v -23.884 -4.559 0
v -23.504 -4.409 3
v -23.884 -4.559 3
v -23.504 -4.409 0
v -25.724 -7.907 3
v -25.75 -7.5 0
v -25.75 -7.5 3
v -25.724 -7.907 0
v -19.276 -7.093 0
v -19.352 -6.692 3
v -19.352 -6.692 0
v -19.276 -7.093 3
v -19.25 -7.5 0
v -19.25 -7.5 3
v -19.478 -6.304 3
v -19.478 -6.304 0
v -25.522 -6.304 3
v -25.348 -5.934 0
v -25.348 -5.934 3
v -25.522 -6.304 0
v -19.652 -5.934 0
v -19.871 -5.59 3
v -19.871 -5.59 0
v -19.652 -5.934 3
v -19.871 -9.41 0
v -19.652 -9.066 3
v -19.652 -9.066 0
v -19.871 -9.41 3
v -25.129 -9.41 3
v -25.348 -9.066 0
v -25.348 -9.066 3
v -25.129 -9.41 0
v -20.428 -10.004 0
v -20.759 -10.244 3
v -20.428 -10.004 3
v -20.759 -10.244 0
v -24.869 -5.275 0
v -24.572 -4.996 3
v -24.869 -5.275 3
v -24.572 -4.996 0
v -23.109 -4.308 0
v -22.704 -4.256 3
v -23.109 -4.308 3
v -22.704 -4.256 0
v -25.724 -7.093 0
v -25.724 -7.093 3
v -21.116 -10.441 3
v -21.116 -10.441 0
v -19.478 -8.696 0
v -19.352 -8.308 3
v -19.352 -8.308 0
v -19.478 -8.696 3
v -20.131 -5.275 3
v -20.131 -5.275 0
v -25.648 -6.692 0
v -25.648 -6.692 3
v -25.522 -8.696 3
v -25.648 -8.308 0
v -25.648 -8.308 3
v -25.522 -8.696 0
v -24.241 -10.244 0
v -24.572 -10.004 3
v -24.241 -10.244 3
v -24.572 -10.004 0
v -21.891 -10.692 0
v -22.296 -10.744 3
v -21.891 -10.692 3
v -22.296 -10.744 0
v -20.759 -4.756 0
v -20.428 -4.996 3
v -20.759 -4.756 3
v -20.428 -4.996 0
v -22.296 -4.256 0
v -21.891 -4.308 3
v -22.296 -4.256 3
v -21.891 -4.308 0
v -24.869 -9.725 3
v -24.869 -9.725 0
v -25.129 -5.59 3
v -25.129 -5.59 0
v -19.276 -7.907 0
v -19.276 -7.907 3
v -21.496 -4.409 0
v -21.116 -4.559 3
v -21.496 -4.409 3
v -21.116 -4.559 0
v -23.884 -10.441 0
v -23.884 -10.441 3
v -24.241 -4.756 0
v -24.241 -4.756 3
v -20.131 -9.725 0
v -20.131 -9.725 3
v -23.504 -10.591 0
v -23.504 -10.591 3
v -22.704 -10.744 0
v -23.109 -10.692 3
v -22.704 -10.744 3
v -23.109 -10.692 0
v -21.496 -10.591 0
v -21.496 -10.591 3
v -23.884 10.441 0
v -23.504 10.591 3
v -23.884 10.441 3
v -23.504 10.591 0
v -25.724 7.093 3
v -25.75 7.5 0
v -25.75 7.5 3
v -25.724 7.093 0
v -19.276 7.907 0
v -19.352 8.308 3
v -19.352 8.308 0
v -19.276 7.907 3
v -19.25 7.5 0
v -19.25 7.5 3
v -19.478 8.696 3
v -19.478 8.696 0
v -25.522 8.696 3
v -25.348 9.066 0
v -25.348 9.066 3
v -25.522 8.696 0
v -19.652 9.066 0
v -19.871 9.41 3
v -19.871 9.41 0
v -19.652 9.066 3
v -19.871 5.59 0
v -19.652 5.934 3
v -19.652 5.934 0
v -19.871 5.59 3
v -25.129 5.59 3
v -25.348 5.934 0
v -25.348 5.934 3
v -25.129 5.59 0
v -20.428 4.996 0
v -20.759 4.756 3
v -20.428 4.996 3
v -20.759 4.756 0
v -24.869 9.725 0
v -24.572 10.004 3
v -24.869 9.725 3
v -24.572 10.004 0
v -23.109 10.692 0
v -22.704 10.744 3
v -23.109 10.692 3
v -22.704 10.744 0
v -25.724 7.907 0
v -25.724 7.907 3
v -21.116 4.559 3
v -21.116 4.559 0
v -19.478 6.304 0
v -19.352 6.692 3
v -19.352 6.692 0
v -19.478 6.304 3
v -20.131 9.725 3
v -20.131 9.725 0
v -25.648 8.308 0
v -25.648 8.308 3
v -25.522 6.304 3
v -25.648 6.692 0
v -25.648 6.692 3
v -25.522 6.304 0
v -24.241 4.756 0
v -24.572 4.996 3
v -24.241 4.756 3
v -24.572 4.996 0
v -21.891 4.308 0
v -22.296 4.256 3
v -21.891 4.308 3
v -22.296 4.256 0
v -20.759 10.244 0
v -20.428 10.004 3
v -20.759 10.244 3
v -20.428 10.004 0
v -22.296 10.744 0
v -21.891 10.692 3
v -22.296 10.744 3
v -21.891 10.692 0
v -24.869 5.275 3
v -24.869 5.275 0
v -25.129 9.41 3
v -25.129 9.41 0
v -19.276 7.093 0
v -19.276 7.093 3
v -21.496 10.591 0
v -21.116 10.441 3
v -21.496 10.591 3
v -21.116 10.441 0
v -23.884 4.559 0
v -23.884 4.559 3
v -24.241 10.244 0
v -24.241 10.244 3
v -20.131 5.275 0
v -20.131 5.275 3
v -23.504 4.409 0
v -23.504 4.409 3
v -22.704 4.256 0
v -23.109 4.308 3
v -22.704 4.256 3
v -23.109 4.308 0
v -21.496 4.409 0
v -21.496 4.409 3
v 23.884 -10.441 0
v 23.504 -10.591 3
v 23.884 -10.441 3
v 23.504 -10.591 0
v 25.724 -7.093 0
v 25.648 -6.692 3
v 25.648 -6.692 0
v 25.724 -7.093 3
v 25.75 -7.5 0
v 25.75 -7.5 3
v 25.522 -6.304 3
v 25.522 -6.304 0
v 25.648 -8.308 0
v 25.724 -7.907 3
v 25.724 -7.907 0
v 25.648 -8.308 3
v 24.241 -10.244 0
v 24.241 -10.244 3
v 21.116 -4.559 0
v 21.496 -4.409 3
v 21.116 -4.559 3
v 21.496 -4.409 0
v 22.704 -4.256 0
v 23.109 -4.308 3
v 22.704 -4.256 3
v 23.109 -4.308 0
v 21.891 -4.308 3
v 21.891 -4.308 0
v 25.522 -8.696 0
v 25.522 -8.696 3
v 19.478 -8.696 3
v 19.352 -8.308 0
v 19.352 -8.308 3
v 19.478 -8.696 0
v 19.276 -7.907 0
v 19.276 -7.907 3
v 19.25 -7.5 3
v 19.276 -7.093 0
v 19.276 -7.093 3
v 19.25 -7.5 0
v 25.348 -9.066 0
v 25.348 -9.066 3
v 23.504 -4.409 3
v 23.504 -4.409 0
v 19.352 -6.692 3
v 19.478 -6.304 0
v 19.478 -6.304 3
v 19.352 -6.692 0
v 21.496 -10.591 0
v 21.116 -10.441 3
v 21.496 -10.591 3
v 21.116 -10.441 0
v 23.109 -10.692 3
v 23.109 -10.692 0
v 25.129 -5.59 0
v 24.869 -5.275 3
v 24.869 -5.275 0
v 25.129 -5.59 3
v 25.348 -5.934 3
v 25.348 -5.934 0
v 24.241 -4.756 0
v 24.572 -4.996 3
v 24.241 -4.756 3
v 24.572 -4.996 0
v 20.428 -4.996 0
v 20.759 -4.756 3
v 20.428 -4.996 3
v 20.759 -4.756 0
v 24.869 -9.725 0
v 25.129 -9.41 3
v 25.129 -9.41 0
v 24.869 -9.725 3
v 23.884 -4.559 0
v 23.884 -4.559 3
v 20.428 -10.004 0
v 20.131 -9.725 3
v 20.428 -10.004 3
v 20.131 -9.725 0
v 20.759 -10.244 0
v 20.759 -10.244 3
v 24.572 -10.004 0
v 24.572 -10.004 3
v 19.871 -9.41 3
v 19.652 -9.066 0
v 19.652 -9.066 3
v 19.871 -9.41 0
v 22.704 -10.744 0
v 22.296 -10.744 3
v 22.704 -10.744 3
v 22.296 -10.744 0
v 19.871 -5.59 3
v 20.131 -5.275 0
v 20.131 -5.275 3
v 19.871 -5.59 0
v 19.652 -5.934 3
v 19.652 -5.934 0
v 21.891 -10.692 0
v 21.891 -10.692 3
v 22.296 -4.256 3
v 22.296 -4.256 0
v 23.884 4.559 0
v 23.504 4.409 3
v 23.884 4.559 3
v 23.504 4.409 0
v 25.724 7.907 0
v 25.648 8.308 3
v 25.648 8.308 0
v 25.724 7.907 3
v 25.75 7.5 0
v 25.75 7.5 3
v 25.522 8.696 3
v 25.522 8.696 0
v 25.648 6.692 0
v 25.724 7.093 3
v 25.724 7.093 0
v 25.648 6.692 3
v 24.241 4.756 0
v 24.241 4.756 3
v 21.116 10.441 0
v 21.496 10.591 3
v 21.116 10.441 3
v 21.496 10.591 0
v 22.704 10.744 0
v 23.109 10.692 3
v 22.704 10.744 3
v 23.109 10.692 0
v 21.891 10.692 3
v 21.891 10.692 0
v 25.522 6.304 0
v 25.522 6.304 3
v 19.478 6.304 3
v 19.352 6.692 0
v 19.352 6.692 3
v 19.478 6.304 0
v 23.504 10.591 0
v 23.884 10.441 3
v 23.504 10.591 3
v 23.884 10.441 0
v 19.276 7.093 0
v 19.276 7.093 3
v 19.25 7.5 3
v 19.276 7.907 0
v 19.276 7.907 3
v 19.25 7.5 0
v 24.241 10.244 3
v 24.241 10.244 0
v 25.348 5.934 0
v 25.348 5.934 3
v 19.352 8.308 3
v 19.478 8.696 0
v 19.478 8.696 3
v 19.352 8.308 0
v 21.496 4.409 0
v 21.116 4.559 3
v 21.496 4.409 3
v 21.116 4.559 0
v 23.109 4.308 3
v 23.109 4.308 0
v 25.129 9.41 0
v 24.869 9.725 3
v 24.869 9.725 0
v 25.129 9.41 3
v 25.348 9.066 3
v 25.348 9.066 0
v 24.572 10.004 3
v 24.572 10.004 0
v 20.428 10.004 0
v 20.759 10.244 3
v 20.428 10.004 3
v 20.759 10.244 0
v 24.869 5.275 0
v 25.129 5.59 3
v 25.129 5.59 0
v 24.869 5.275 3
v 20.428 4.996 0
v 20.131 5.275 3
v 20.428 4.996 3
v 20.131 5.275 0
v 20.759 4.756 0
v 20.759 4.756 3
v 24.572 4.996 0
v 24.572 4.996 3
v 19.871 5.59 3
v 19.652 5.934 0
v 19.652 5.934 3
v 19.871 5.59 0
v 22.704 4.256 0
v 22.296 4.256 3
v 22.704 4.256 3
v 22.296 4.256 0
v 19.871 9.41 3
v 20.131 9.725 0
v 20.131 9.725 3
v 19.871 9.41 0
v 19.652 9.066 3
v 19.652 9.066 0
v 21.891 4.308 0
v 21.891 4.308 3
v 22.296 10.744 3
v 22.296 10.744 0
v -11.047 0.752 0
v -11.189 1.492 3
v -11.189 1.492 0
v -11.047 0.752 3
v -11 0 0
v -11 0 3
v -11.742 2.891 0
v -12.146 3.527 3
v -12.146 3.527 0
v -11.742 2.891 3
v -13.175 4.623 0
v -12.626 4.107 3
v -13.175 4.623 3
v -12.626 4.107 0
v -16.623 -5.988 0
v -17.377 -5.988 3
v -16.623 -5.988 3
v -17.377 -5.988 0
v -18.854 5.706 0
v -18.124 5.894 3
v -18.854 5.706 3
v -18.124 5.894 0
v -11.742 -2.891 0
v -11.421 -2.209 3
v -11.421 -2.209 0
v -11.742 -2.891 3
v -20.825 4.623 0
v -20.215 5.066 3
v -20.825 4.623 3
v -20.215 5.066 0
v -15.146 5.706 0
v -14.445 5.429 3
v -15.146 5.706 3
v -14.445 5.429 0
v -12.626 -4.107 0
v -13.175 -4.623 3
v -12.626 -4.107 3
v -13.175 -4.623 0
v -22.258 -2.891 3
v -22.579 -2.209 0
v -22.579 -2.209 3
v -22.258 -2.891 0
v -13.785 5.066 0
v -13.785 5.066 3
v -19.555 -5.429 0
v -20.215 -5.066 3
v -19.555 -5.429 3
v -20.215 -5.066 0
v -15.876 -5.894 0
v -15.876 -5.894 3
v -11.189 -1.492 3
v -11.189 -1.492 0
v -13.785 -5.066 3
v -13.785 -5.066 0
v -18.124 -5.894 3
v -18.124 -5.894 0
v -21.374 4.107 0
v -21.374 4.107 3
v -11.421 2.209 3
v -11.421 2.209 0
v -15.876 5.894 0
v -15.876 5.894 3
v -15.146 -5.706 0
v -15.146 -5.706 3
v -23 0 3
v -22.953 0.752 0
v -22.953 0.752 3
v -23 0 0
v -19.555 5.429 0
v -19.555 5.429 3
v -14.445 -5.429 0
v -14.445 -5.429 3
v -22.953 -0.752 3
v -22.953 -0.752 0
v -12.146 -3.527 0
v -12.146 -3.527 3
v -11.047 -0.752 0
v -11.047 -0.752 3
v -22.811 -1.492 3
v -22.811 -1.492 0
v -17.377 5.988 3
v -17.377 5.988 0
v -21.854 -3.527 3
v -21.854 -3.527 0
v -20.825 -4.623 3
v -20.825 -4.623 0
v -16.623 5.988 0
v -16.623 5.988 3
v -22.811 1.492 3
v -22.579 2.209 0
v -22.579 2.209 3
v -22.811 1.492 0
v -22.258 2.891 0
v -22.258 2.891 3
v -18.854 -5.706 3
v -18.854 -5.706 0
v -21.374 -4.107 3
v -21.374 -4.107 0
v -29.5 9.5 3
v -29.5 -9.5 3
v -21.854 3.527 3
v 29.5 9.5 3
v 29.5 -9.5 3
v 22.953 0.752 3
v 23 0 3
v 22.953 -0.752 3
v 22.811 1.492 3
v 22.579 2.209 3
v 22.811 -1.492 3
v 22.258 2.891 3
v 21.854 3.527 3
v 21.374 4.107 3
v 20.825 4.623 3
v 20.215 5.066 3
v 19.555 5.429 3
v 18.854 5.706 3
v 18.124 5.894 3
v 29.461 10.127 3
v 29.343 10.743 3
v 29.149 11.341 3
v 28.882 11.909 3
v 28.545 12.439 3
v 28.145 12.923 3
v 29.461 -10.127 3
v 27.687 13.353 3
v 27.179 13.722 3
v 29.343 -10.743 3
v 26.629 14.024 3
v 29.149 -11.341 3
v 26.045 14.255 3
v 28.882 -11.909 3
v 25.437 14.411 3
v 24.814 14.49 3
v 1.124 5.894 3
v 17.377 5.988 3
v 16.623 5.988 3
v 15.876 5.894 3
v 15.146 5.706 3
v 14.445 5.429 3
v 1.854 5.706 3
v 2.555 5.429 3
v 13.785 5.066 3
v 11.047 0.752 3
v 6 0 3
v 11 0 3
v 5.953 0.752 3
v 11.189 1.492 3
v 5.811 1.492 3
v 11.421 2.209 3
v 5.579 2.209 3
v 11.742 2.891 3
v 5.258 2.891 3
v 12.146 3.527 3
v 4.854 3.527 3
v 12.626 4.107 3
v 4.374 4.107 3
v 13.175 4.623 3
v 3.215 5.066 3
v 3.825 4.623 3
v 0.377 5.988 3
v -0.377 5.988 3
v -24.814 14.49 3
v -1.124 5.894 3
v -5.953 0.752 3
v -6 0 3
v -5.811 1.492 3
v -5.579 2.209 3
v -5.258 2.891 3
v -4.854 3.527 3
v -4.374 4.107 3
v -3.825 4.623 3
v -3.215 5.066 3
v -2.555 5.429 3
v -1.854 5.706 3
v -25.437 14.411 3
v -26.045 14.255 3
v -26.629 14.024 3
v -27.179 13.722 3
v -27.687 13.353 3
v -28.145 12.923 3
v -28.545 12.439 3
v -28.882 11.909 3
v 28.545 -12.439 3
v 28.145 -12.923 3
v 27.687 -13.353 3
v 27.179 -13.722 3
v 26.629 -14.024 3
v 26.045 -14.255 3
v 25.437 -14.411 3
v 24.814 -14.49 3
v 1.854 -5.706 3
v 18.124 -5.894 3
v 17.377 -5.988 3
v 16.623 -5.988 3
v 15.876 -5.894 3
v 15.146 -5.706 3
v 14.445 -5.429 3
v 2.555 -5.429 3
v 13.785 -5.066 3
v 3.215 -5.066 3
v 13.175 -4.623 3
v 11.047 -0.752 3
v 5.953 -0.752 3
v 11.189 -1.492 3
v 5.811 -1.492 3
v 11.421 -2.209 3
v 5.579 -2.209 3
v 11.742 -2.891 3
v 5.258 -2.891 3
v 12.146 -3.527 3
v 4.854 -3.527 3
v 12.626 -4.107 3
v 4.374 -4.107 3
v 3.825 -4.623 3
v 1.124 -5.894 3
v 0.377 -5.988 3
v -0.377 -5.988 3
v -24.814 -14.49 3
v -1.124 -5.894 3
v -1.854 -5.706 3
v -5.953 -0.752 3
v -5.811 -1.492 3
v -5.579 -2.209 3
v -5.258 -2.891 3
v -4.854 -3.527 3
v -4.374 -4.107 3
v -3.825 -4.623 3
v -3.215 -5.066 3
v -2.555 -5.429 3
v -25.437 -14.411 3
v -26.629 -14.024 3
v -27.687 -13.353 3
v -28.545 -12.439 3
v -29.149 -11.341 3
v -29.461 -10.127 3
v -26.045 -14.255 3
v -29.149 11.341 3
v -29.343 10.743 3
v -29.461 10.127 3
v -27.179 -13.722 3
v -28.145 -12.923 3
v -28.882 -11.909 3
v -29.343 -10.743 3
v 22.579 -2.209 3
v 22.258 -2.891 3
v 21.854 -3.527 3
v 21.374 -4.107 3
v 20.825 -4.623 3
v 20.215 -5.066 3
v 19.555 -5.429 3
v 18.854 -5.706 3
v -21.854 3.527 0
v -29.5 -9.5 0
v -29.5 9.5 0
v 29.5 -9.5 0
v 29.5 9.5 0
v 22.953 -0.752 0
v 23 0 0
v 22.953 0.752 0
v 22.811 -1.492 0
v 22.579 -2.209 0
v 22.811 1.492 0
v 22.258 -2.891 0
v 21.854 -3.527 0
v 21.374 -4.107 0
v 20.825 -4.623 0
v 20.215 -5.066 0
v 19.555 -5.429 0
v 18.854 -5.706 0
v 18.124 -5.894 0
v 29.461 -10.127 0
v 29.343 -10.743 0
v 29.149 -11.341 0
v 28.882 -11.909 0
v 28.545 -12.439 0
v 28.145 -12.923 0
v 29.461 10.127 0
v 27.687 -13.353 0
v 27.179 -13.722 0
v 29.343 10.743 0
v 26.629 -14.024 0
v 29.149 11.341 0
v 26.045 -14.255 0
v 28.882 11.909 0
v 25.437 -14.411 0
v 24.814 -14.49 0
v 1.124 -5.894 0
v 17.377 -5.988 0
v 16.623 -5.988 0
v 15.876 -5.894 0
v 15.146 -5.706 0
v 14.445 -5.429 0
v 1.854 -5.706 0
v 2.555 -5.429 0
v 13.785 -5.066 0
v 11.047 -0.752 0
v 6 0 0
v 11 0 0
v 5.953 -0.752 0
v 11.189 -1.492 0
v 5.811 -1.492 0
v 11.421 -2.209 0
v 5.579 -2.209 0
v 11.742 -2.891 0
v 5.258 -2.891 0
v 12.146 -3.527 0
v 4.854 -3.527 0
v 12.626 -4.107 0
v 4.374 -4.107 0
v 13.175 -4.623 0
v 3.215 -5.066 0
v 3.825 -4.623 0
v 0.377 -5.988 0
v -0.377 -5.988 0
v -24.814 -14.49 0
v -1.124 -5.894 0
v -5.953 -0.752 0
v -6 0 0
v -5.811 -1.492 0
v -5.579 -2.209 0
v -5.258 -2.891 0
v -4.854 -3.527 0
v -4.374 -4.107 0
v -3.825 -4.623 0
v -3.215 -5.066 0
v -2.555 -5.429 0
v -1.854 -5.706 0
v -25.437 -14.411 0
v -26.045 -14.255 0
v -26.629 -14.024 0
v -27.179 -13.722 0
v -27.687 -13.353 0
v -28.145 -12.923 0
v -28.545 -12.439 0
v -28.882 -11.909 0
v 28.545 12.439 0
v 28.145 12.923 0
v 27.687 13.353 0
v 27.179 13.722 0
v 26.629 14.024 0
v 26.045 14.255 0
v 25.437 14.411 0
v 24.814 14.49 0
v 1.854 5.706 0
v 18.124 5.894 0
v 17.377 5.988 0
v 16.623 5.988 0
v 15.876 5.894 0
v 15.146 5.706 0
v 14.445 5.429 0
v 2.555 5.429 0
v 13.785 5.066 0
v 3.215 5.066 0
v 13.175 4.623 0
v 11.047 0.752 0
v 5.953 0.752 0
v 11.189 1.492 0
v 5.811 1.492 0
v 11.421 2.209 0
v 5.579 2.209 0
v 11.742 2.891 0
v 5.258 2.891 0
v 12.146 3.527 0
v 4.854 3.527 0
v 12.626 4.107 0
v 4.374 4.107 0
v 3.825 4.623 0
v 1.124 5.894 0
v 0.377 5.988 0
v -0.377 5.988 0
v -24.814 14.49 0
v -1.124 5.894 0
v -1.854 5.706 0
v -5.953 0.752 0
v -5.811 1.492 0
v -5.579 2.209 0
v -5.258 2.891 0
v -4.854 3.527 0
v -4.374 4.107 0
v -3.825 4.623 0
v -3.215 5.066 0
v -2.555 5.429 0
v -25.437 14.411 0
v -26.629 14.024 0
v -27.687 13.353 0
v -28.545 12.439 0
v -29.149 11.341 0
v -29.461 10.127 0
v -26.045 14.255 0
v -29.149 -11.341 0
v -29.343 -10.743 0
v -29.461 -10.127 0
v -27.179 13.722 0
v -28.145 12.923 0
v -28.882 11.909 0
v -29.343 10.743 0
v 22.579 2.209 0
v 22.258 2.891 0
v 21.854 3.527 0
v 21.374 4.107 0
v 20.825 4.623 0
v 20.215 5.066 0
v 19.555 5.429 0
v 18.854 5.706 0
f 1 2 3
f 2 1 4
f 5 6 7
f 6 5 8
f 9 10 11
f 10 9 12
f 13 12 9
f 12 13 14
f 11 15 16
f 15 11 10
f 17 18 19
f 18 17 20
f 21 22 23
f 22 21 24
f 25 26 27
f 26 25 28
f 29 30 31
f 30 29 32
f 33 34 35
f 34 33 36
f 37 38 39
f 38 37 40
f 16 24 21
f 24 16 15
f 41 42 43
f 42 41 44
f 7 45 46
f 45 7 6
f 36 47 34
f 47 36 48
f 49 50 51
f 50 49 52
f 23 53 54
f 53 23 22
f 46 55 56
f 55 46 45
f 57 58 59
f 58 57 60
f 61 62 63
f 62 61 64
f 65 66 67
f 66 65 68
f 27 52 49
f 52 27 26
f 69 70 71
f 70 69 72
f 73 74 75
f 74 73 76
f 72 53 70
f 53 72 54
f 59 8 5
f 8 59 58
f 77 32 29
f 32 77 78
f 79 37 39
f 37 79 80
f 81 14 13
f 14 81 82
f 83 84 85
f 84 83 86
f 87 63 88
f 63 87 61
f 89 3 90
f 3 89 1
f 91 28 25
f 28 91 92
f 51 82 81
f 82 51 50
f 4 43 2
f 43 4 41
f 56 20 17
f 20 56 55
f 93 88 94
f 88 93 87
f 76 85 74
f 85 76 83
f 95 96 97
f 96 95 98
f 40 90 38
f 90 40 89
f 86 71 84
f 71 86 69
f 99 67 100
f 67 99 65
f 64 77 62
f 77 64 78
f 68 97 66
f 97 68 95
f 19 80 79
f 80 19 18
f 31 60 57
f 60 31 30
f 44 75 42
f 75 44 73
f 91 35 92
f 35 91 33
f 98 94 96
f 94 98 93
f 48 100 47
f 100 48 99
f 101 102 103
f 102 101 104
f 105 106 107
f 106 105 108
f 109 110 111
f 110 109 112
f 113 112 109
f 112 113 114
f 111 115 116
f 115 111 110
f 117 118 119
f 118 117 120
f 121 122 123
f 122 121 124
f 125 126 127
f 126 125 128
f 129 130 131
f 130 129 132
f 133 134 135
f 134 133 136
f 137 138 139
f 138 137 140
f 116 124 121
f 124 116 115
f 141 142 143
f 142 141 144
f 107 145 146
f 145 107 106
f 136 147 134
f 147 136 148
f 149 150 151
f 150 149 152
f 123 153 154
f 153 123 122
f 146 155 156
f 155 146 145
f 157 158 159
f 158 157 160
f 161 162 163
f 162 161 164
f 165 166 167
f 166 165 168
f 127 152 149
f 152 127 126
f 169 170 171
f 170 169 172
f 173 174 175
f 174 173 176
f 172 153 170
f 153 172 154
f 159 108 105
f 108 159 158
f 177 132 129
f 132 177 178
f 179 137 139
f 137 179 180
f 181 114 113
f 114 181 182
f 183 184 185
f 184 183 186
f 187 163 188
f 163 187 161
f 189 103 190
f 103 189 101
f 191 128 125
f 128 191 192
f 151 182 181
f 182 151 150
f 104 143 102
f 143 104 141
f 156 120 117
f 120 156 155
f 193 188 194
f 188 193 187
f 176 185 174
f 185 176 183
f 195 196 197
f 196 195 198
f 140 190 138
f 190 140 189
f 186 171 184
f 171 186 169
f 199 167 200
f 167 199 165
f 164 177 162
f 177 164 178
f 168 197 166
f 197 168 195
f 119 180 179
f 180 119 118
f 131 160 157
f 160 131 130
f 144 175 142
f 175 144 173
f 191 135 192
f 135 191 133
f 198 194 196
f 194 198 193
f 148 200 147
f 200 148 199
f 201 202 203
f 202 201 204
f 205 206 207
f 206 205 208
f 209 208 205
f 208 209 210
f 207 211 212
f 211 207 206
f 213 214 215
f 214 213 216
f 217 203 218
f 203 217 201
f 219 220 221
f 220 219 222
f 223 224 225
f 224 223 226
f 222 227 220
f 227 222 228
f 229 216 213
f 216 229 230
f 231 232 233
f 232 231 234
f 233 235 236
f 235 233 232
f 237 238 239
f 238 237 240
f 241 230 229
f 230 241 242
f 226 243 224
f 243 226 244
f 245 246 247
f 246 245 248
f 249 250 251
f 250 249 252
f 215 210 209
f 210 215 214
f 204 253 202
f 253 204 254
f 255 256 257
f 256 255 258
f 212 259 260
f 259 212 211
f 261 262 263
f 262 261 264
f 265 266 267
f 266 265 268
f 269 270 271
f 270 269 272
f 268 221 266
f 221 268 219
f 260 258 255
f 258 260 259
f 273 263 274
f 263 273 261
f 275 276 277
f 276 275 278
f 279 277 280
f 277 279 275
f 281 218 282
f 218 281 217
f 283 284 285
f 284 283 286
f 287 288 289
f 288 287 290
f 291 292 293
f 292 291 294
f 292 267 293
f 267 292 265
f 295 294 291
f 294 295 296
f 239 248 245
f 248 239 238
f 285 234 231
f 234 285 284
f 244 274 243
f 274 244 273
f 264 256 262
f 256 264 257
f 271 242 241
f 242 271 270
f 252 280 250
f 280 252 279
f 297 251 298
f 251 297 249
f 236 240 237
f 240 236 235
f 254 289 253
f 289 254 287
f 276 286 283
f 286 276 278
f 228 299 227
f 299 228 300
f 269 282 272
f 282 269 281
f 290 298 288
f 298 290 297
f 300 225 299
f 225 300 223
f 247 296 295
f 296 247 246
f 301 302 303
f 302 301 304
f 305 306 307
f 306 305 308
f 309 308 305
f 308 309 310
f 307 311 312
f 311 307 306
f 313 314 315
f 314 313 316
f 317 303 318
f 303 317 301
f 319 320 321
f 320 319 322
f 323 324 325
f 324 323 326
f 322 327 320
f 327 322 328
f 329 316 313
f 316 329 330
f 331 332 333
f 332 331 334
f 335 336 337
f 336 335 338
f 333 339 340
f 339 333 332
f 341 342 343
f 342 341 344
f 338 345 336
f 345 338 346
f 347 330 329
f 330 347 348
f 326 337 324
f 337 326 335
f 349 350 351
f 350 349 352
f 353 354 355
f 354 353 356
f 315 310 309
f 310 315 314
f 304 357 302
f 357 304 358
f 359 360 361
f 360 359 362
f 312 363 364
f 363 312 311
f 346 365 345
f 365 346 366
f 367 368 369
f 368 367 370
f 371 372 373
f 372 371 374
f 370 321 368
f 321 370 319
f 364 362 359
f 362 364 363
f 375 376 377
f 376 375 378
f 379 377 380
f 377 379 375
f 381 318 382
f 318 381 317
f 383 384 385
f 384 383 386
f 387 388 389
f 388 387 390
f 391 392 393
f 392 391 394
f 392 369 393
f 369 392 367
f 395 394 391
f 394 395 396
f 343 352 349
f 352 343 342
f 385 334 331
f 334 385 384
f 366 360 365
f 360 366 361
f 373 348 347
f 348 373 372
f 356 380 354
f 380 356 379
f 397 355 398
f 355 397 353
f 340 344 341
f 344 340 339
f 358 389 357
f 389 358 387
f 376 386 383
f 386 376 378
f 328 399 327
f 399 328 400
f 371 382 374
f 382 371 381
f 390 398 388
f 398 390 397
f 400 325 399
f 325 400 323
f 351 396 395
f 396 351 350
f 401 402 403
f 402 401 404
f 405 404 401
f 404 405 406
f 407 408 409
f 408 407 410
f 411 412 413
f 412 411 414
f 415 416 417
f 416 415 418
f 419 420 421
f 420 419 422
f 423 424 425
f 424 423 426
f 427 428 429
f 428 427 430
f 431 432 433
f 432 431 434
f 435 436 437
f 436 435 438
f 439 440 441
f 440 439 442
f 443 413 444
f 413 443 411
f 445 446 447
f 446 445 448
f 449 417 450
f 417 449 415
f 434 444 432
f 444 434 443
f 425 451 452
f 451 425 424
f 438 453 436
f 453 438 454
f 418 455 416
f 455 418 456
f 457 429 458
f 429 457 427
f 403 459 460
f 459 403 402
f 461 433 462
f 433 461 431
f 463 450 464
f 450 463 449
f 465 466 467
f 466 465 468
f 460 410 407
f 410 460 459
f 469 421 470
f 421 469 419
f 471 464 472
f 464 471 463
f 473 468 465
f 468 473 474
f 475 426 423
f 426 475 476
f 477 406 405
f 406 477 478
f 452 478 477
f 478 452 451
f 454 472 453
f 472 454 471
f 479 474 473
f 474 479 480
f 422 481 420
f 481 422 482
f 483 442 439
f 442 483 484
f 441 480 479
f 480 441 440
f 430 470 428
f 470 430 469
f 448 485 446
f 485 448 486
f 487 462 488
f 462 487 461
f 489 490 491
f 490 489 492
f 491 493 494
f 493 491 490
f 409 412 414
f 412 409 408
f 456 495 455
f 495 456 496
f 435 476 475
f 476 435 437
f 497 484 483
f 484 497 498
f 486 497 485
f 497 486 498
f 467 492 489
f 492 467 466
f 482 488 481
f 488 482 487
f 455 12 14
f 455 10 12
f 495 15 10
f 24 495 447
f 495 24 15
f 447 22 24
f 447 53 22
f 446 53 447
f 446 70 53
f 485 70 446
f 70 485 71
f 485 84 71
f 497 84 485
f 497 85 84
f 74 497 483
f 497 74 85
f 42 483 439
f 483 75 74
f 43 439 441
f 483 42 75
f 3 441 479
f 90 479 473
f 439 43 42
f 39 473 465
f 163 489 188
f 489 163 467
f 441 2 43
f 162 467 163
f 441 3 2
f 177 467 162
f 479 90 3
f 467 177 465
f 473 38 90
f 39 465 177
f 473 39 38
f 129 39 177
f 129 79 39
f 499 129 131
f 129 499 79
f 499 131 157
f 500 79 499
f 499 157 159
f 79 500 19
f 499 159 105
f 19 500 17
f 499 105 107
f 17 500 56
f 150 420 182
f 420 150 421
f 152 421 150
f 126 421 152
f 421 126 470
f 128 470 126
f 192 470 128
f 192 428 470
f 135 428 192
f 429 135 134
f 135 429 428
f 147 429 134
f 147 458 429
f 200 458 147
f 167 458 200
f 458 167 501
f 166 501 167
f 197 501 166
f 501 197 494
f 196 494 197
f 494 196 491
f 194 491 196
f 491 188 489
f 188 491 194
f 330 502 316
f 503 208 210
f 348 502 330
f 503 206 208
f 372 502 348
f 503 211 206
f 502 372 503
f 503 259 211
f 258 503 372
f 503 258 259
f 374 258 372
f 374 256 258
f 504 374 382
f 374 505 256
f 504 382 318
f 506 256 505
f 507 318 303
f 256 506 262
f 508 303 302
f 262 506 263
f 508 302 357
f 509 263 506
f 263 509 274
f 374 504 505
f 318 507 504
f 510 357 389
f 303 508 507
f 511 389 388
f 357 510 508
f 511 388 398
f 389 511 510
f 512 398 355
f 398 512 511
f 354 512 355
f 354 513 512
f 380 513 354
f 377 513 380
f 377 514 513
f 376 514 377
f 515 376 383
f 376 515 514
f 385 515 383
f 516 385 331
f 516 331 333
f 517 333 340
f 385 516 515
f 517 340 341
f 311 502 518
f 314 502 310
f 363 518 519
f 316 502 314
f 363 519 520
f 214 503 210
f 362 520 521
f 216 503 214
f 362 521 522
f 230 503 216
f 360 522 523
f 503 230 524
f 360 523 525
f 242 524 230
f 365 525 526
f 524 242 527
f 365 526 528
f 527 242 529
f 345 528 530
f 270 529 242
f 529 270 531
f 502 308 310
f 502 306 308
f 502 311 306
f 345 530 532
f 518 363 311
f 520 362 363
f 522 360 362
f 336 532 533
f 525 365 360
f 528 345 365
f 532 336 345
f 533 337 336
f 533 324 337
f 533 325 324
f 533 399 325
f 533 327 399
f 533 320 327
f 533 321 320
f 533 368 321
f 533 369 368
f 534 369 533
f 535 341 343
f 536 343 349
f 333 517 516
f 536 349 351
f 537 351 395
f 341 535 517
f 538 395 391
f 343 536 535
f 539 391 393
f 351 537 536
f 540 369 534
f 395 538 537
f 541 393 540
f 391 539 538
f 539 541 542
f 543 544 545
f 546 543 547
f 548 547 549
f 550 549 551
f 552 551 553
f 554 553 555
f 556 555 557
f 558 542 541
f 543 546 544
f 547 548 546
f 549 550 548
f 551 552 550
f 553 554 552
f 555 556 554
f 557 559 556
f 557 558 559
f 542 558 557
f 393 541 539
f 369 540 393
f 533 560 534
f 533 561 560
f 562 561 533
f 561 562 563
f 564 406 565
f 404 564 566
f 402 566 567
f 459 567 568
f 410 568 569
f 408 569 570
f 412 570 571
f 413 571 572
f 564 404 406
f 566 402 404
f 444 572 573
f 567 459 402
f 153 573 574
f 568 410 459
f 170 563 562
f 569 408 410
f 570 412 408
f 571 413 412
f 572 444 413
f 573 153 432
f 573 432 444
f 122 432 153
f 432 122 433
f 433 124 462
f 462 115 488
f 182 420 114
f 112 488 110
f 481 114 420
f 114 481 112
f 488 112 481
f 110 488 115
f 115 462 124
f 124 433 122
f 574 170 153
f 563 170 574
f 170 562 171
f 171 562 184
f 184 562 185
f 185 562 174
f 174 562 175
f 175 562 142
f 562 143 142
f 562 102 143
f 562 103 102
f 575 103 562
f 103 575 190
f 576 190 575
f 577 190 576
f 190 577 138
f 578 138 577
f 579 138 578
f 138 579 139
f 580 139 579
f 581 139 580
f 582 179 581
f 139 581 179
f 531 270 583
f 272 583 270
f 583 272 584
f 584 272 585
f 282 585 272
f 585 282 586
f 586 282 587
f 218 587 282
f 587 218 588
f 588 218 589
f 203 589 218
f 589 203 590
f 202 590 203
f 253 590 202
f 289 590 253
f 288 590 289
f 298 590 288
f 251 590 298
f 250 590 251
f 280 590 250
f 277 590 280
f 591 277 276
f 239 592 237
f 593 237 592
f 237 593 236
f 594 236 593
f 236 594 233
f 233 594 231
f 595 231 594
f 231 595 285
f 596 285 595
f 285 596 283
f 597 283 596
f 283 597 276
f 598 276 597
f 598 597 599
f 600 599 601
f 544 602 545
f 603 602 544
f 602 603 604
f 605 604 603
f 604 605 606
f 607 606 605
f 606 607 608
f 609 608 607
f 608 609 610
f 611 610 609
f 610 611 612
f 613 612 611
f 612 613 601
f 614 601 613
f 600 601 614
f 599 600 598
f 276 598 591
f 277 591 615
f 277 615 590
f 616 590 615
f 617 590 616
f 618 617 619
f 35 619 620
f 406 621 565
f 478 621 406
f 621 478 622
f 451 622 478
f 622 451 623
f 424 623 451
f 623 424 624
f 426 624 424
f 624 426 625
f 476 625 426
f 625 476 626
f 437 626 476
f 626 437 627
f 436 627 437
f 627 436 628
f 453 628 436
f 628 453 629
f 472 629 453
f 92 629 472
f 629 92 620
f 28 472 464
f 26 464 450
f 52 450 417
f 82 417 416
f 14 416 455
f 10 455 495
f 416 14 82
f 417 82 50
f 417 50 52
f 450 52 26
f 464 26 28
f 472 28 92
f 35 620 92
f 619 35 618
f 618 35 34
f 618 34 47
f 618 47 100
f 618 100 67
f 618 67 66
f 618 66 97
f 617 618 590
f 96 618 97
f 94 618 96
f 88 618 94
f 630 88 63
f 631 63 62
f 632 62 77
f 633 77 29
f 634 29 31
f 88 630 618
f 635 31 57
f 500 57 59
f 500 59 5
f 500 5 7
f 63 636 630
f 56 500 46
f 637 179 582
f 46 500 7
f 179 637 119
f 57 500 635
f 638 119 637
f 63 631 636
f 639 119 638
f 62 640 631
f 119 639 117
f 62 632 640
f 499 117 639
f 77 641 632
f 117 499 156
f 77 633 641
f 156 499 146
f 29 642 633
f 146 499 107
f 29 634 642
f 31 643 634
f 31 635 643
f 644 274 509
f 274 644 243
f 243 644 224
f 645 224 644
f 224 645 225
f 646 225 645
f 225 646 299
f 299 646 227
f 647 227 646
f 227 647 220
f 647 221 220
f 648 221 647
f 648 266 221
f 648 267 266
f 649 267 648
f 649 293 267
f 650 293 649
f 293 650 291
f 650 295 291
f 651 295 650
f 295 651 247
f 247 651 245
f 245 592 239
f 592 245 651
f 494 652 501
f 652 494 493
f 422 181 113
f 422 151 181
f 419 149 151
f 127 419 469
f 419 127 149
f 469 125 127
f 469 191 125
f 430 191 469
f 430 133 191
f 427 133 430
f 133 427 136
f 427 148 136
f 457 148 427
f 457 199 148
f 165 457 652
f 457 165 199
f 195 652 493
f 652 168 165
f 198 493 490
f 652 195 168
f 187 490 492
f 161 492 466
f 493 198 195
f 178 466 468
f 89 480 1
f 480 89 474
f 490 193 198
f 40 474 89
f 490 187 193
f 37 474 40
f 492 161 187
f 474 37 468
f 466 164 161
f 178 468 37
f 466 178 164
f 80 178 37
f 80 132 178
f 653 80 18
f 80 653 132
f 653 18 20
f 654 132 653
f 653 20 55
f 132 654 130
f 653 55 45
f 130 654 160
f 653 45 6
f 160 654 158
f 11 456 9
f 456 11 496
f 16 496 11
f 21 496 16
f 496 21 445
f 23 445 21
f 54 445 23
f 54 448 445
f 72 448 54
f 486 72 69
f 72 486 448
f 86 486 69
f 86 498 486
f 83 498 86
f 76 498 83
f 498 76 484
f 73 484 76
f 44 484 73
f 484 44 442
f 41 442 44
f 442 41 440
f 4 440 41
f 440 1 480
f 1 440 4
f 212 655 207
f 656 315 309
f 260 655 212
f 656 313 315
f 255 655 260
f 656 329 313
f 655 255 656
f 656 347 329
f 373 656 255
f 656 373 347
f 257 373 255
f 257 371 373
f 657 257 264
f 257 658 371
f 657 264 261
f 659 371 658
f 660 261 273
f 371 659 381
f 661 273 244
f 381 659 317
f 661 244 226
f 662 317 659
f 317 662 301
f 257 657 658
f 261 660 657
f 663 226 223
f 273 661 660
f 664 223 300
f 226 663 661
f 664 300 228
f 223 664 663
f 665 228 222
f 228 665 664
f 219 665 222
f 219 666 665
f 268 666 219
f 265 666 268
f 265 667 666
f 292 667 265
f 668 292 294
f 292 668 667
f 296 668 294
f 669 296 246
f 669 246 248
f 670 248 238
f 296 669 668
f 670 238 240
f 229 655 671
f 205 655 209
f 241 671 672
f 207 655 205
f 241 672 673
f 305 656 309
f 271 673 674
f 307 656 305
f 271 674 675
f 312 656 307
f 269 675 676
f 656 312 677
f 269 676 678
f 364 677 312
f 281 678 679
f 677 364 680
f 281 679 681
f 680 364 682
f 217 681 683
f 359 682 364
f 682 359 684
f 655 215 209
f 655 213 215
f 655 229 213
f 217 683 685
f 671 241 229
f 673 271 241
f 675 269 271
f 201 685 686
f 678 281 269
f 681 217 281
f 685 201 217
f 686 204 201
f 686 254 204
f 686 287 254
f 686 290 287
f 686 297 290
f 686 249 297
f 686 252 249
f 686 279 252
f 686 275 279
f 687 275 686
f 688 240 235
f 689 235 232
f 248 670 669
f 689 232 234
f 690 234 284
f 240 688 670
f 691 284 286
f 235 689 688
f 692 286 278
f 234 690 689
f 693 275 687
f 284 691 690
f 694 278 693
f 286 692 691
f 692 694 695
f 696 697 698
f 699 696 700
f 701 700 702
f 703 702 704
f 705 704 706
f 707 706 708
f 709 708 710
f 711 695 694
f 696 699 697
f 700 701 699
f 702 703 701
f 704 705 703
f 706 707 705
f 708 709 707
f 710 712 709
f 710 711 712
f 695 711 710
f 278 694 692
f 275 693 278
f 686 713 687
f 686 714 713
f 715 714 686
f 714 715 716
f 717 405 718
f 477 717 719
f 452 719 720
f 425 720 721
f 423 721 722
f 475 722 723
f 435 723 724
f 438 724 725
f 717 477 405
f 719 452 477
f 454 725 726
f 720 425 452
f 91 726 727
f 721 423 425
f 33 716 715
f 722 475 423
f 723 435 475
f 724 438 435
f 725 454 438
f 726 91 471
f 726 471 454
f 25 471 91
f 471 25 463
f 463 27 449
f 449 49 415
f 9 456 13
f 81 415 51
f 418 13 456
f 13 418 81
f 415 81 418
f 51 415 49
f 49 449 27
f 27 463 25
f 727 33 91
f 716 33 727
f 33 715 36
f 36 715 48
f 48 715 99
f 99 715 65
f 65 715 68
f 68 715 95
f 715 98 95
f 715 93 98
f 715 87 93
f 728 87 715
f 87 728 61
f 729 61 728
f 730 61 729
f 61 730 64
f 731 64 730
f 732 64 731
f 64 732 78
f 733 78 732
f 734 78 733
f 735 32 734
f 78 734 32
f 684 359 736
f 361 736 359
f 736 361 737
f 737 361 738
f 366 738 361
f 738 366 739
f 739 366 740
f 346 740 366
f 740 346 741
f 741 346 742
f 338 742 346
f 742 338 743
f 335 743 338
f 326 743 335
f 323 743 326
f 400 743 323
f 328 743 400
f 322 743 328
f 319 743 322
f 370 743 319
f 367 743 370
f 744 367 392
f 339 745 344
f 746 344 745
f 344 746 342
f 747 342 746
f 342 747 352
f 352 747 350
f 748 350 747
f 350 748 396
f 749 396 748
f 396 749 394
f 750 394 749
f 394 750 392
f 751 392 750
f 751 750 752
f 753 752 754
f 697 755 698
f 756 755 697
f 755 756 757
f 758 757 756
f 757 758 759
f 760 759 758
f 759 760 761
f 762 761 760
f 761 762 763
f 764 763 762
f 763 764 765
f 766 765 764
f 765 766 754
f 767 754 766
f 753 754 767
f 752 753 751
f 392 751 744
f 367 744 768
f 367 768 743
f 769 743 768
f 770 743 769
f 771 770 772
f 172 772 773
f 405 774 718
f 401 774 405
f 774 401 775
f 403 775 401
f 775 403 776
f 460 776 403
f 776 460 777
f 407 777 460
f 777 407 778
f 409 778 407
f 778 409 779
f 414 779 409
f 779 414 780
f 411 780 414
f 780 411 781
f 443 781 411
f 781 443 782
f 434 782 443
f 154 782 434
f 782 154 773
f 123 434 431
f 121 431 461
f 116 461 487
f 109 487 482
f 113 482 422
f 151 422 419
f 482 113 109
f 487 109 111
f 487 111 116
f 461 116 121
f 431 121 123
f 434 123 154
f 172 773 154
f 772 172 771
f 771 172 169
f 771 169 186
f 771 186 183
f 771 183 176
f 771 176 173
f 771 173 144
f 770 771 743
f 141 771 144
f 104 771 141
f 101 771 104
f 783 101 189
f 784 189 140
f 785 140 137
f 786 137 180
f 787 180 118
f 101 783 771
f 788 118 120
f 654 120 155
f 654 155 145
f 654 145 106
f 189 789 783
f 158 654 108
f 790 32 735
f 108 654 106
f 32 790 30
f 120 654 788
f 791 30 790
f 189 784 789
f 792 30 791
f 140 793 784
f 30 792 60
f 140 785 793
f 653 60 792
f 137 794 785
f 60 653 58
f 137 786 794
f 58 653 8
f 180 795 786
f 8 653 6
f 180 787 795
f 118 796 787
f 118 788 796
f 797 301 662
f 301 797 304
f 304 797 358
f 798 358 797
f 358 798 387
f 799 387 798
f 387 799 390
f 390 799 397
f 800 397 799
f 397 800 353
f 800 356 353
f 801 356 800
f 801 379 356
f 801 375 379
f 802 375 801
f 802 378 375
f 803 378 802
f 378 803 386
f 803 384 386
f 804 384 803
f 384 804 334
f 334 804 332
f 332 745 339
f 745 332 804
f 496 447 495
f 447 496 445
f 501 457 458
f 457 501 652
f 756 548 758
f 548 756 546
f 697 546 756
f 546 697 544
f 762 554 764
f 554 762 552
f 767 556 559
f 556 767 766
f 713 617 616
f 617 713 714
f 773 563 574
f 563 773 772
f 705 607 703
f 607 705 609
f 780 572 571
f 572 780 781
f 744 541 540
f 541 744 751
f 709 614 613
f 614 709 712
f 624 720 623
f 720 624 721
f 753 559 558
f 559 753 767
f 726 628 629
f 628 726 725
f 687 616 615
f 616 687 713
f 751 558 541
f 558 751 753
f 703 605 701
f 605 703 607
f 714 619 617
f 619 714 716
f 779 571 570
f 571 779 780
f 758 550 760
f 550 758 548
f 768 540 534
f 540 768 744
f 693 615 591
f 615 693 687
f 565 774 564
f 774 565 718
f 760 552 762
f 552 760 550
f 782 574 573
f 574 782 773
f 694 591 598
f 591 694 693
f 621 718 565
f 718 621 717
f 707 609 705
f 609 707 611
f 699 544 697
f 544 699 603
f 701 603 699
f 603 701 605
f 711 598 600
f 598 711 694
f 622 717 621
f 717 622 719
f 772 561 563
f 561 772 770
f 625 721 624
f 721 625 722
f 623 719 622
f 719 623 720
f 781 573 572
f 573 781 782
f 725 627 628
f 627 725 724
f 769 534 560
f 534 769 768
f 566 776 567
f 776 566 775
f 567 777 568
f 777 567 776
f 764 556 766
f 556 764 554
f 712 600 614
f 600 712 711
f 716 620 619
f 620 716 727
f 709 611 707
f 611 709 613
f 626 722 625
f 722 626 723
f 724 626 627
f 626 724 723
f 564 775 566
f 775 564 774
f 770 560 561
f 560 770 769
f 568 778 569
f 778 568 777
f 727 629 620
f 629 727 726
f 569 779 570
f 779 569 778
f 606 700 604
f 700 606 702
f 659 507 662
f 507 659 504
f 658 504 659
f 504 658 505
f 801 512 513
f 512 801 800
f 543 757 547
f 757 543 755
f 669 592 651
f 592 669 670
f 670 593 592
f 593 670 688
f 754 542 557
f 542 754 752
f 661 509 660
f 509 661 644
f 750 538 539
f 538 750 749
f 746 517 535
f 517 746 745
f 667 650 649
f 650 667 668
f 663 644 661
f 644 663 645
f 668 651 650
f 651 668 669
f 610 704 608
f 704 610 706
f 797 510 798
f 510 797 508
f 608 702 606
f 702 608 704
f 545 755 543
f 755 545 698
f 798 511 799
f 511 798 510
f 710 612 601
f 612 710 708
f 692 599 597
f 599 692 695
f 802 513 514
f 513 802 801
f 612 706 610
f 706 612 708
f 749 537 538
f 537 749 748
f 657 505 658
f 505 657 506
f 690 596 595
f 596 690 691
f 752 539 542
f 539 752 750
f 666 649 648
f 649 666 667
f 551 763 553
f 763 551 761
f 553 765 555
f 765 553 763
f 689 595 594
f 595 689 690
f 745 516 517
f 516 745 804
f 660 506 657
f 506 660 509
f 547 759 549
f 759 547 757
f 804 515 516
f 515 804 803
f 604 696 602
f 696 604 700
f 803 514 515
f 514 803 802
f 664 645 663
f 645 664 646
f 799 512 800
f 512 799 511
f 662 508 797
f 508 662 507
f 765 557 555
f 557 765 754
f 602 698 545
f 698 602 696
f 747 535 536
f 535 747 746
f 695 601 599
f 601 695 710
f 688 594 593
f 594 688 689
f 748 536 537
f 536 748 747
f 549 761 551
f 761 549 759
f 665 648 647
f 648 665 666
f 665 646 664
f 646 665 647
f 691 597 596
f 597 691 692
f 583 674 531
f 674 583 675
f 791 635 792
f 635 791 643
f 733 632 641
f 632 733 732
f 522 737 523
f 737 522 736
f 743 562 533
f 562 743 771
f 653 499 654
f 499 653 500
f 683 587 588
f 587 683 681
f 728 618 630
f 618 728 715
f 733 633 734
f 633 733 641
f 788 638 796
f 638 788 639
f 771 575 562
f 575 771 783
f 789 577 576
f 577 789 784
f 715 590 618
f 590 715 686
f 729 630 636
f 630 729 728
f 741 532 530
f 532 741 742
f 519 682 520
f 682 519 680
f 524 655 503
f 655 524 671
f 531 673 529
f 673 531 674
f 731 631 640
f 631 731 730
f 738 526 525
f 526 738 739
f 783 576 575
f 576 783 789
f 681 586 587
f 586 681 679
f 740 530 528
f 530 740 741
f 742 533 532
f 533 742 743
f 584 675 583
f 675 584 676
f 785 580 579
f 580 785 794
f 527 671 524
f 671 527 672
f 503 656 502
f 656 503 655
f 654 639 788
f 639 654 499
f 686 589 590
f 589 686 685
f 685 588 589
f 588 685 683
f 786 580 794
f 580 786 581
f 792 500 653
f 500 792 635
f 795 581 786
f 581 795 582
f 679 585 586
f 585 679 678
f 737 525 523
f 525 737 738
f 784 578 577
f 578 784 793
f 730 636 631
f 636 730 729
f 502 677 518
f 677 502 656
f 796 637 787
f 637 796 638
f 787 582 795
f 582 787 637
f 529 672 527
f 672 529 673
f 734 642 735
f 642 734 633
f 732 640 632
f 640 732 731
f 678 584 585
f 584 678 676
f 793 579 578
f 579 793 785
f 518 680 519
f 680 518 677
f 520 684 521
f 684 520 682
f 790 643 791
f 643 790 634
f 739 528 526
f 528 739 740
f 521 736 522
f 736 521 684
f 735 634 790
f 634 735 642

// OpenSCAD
$fn = 50;

difference() {
	union() {
		hull() {
			translate(v = [-24.5, 9.5, 0]) {
				cylinder(h = 3, r = 5);
			}
			translate(v = [24.5, 9.5, 0]) {
				cylinder(h = 3, r = 5);
			}
			translate(v = [-24.5, -9.5, 0]) {
				cylinder(h = 3, r = 5);
			}
			translate(v = [24.5, -9.5, 0]) {
				cylinder(h = 3, r = 5);
			}
		}
	}
	union() {
		translate(v = [-22.5, -7.5, -100.0]) {
			cylinder(h = 200, r = 3.25);
		}
		translate(v = [-22.5, 7.5, -100.0]) {
			cylinder(h = 200, r = 3.25);
		}
		translate(v = [22.5, -7.5, -100.0]) {
			cylinder(h = 200, r = 3.25);
		}
		translate(v = [22.5, 7.5, -100.0]) {
			cylinder(h = 200, r = 3.25);
		}
		translate(v = [-22.5, -7.5, -100.0]) {
			cylinder(h = 200, r = 1.8);
		}
		translate(v = [-22.5, 7.5, -100.0]) {
			cylinder(h = 200, r = 1.8);
		}
		translate(v = [22.5, -7.5, -100.0]) {
			cylinder(h = 200, r = 1.8);
		}
		translate(v = [22.5, 7.5, -100.0]) {
			cylinder(h = 200, r = 1.8);
		}
		translate(v = [-17.0, 0, 0.0]) {
			cylinder(h = 3, r = 6.0);
		}
		cylinder(h = 3, r = 6.0);
		translate(v = [17.0, 0, 0.0]) {
			cylinder(h = 3, r = 6.0);
		}
	}
}
